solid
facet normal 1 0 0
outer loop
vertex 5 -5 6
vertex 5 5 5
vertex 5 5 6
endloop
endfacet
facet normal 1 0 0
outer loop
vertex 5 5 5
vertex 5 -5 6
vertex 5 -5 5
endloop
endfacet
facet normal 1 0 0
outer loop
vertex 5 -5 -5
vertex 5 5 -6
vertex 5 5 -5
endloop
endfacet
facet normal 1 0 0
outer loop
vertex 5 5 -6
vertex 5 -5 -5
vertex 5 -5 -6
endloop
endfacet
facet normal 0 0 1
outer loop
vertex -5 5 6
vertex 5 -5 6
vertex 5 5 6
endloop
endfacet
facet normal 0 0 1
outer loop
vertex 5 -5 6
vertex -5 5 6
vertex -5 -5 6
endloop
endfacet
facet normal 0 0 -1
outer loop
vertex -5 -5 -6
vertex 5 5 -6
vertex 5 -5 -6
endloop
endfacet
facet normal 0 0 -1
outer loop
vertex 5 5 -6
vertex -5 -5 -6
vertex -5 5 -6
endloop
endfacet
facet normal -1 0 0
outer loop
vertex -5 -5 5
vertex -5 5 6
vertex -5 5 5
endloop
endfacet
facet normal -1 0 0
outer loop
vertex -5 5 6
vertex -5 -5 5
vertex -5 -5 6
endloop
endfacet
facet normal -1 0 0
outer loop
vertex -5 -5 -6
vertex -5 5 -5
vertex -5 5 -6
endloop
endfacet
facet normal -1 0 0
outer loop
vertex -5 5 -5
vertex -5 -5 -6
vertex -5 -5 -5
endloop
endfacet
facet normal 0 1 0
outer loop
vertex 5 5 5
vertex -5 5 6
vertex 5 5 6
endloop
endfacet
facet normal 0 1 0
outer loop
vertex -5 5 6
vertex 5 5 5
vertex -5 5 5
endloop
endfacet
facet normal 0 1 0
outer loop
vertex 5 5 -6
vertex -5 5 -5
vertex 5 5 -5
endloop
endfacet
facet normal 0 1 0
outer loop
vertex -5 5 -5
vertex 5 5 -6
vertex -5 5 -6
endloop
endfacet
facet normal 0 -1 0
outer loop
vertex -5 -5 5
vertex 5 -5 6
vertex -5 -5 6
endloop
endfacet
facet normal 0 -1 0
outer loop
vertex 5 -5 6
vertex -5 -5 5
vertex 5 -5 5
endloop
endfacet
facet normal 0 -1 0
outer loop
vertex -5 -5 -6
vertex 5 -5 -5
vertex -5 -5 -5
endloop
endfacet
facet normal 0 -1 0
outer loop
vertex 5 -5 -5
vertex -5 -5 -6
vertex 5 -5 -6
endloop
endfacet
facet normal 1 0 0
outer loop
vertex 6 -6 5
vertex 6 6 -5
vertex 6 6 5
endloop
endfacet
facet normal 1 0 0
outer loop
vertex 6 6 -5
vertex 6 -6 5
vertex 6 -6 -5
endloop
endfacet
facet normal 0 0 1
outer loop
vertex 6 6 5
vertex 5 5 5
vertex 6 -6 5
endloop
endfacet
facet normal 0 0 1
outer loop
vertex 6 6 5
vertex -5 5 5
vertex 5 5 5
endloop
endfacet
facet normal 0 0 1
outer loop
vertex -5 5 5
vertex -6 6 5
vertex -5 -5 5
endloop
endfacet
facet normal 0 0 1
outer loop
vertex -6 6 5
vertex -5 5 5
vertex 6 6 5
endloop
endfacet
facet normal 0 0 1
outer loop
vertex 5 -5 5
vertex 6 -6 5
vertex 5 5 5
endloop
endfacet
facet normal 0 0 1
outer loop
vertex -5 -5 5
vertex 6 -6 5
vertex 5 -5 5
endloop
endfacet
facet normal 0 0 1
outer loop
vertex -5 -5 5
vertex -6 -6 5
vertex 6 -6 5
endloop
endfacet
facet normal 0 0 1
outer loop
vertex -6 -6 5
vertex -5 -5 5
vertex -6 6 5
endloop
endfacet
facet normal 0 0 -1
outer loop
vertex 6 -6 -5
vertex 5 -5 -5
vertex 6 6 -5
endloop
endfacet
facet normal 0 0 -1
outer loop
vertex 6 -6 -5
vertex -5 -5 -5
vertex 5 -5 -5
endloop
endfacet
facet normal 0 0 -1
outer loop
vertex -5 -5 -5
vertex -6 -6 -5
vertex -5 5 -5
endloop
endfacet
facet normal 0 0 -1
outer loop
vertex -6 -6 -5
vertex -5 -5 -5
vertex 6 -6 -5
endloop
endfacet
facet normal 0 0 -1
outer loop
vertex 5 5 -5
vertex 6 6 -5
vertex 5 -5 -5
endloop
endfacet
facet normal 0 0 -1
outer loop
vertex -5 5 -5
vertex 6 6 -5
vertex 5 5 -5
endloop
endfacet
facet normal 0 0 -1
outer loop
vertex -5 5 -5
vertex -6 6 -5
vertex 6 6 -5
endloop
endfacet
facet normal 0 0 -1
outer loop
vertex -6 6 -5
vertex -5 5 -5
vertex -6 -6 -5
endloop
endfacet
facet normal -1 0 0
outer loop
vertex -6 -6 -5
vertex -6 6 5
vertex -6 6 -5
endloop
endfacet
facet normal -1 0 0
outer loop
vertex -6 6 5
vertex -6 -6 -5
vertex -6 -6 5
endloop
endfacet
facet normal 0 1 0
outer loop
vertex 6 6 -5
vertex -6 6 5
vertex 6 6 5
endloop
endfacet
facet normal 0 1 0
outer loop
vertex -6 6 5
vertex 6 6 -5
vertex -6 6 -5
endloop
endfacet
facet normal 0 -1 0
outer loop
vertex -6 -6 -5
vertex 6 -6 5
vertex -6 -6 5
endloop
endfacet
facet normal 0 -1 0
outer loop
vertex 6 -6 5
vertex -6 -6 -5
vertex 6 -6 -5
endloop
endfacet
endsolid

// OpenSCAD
// Unit of length: Unit.MM
union()
{
   color(c = [1.0, 0.0, 0.0, 1.0])
   {
      cube(size = [10.0, 10.0, 12.0], center = true);
   }
   cube(size = [12.0, 12.0, 10.0], center = true);
}
